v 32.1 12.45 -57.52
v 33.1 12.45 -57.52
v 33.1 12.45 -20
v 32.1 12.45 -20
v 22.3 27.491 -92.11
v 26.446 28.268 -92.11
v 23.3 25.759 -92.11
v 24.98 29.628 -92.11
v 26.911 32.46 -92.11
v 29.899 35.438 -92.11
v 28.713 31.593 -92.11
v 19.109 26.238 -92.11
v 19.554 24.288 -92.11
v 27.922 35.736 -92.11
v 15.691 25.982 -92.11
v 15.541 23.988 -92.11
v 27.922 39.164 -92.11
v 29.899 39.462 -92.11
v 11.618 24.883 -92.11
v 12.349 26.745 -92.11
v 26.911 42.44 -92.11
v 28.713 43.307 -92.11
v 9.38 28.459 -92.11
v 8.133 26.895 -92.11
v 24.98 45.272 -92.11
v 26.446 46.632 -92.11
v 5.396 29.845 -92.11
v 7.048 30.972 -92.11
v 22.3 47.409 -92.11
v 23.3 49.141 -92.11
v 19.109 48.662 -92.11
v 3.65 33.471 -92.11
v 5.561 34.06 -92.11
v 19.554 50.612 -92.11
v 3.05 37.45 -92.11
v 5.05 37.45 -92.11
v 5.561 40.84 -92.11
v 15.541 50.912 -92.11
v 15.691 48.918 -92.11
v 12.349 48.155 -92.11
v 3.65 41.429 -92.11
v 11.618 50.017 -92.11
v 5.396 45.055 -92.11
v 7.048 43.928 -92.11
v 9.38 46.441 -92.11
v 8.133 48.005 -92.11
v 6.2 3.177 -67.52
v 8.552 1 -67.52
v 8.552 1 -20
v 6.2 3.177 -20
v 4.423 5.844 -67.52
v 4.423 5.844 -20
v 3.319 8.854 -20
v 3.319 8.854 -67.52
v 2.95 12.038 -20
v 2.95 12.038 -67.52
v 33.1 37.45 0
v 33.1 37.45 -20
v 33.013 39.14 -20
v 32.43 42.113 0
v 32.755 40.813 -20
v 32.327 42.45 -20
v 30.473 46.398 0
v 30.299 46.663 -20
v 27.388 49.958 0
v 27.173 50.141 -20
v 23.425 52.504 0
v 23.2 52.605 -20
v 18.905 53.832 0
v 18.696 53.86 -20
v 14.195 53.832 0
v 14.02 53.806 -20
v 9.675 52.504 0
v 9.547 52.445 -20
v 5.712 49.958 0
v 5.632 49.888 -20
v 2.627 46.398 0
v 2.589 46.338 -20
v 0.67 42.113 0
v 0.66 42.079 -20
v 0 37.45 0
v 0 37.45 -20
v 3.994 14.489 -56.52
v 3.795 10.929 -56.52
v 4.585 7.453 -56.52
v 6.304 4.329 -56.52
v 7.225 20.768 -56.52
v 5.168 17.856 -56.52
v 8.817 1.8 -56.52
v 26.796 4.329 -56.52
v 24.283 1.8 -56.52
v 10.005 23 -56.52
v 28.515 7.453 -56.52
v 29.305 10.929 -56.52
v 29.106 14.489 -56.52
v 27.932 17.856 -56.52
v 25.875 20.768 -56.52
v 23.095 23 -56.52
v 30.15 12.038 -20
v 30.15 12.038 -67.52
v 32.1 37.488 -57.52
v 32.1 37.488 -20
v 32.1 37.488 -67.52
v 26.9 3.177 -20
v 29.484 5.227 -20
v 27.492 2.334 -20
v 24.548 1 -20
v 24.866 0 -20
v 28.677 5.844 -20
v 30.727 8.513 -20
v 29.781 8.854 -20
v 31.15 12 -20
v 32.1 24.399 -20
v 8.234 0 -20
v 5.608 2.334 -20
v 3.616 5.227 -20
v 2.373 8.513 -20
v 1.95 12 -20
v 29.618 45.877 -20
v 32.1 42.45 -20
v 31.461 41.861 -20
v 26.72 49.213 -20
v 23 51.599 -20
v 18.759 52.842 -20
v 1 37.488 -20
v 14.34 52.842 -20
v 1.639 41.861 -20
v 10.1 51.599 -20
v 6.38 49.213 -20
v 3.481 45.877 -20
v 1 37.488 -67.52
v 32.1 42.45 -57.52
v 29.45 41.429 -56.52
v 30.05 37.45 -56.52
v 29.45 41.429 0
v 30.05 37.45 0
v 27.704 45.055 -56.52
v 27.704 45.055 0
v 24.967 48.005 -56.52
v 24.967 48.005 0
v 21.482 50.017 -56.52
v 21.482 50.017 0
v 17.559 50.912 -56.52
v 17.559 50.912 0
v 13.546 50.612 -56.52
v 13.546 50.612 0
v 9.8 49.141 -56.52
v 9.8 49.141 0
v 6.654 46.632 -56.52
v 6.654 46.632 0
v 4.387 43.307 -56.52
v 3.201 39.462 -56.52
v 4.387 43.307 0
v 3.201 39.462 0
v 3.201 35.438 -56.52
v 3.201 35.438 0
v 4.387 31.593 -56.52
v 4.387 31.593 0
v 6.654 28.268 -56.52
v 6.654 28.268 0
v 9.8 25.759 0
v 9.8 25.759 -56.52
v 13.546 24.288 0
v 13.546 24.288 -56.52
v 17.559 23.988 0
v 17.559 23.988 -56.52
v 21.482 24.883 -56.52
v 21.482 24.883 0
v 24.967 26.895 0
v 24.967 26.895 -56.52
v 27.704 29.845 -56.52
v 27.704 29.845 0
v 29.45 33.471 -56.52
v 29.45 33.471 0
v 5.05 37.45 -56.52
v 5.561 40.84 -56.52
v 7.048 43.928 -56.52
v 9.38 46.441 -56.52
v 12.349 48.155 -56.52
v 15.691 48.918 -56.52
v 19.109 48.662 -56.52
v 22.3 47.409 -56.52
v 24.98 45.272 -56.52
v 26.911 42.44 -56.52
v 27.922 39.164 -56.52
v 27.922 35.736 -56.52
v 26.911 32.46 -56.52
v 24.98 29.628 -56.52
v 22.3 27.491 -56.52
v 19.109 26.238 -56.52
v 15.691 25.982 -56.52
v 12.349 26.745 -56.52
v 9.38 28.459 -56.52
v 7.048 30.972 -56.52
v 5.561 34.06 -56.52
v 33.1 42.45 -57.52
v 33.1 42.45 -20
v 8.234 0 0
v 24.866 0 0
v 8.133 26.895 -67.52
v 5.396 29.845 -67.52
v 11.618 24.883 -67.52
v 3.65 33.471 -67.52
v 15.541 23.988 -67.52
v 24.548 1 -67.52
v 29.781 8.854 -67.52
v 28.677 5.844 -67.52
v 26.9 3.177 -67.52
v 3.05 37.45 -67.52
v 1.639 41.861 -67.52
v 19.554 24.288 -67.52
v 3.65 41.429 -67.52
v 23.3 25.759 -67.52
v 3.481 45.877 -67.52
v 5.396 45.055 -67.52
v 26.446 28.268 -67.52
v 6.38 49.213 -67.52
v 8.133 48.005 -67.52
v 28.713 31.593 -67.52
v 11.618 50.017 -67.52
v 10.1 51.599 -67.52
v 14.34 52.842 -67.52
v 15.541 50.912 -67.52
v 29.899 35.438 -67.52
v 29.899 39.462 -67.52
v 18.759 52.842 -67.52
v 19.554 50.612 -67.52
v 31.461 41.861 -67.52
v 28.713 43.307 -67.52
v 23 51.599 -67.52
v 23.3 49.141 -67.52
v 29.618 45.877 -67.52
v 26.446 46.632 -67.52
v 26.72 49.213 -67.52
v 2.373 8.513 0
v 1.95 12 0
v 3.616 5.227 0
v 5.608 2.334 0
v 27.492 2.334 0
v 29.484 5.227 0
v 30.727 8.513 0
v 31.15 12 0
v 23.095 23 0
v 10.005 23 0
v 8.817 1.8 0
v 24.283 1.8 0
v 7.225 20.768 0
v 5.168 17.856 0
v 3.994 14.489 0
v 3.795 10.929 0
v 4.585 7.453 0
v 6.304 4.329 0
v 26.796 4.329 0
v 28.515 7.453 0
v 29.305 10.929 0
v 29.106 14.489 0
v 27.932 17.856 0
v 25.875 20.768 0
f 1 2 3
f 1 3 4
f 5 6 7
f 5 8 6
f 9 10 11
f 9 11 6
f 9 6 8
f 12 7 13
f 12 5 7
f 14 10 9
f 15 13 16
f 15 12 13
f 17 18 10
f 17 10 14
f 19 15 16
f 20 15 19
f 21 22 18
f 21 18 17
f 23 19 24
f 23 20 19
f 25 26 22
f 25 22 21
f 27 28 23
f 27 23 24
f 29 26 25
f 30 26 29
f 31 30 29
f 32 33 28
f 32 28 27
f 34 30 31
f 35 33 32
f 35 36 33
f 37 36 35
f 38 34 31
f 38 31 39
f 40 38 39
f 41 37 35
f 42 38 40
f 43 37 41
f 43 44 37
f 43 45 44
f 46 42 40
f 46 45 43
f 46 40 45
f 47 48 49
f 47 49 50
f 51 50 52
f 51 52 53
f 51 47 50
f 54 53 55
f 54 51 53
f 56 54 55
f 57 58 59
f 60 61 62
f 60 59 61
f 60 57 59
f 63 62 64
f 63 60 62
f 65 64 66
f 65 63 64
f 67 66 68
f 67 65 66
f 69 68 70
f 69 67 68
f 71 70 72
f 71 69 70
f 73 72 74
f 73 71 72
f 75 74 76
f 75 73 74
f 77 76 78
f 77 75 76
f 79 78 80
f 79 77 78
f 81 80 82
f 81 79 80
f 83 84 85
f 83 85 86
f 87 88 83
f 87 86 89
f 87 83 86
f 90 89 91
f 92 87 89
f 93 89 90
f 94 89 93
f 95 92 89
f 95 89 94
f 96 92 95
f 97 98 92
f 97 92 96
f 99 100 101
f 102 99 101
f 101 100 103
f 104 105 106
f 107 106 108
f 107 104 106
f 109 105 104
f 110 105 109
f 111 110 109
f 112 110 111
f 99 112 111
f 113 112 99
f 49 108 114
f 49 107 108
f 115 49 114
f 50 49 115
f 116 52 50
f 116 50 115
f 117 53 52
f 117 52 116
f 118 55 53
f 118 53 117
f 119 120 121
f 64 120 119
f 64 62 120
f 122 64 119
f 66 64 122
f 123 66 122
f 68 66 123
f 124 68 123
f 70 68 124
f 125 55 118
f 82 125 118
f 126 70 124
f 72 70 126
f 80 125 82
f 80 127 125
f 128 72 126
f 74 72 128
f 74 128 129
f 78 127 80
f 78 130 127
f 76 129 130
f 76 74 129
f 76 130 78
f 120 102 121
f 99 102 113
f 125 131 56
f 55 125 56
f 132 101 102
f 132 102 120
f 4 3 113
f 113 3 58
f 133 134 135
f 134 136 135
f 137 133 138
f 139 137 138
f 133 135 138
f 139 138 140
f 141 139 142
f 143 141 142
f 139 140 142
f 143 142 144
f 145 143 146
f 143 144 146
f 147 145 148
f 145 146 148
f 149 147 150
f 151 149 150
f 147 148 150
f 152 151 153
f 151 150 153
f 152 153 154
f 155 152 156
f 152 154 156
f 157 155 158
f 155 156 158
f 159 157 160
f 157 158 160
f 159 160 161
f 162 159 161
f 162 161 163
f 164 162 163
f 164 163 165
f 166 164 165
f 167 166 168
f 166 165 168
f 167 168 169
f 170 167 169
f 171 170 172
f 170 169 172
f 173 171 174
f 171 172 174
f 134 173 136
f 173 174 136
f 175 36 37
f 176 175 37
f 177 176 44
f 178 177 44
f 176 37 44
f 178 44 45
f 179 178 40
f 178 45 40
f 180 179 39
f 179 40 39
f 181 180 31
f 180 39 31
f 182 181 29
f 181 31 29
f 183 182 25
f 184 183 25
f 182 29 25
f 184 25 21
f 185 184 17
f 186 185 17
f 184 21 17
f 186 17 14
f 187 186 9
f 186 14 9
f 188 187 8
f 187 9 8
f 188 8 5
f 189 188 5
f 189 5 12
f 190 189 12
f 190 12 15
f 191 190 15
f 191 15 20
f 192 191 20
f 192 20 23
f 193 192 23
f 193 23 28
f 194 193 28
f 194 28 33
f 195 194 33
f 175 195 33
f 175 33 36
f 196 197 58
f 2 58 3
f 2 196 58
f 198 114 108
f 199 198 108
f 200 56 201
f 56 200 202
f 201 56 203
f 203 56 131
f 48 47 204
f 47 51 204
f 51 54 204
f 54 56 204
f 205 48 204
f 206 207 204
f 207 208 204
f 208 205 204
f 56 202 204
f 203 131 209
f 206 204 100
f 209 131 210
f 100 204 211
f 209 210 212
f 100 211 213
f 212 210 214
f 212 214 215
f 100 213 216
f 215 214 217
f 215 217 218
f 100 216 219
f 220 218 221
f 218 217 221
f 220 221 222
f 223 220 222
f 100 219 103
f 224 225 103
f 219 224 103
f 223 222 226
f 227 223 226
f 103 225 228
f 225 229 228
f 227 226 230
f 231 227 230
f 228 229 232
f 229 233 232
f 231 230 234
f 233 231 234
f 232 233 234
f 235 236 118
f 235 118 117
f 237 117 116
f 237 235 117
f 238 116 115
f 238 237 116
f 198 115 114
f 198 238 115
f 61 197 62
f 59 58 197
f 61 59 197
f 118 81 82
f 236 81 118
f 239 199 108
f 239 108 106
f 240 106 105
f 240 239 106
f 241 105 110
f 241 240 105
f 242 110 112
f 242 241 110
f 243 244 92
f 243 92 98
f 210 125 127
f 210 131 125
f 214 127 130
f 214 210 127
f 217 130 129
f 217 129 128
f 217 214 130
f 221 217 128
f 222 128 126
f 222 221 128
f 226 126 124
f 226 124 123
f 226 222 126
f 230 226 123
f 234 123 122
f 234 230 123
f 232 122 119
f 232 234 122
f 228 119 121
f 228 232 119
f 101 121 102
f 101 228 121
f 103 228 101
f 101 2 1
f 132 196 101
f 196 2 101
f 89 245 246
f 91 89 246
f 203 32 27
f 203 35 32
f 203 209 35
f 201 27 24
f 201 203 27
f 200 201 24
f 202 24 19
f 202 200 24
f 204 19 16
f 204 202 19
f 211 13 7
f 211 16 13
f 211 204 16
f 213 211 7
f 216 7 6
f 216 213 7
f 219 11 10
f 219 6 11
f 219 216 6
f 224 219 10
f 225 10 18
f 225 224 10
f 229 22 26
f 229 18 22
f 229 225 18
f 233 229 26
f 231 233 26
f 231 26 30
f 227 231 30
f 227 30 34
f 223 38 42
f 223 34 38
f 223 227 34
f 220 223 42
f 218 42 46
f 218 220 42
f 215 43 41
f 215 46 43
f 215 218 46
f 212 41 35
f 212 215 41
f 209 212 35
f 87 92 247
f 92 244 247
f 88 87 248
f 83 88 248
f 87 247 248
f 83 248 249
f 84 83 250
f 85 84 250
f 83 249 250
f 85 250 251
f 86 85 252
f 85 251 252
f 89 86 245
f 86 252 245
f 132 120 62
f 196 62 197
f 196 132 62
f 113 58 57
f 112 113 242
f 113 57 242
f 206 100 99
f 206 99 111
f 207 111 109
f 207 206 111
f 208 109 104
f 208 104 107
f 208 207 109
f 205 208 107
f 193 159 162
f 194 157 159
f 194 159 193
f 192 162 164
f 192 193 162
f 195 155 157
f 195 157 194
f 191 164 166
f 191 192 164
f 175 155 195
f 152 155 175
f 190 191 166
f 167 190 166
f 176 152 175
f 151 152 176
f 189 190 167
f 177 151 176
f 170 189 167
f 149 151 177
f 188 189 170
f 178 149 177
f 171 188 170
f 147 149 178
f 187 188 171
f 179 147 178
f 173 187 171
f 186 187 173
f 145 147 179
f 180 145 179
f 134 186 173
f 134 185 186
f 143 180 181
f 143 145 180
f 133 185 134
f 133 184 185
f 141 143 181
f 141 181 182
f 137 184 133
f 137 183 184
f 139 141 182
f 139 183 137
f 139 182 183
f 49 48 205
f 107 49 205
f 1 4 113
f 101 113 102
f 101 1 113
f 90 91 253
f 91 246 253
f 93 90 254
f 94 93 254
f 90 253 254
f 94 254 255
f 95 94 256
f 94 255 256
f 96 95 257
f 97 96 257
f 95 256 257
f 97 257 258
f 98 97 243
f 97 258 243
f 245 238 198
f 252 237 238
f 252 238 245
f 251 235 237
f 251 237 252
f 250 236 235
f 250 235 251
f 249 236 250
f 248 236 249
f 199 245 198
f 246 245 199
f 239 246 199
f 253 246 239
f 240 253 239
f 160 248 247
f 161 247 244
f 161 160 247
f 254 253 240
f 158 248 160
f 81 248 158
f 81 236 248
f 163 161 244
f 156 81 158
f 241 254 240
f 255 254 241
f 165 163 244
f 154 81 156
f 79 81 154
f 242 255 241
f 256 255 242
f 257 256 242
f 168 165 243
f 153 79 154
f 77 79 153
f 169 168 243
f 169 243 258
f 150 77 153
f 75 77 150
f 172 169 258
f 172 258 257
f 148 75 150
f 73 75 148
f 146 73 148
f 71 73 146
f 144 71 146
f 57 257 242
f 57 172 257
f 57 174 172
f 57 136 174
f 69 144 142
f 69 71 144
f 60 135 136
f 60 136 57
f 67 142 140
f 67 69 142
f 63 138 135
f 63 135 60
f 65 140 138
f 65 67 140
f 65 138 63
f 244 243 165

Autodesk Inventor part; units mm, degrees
ref_plane "YZ Plane" through (0, 0, 0) normal (1, 0, 0) x (0, 1, 0)
ref_plane "XZ Plane" through (0, 0, 0) normal (0, 1, 0) x (-1, 0, 0)
ref_plane "XY Plane" through (0, 0, 0) normal (0, 0, 1) x (1, 0, 0)
sketch "Sketch1" plane through (0, 0, 0) normal (0, 0, 1) x (1, 0, 0)
  line L0 (0, 0) -> (33.1, 0)
  line L1 (33.1, 0) -> (33.1, 54)
  line L2 (33.1, 54) -> (0, 54)
  line L3 (0, 54) -> (0, 0)
  arc A0 (32.9068, 34.9287) -> (0.1932, 34.9287) centre (16.55, 37.45) ccw
  line L4 (0, 37.45) -> (1.95, 12)
  line L5 (1.95, 12) -> (13.9851, 12) construction
  line L6 (8.2338, 0) -> (24.8662, 0)
  line L7 (33.1, 37.45) -> (31.15, 12)
  arc A1 (1.95, 12) -> (8.2338, 0) centre (16.55, 12) ccw
  arc A2 (24.8662, 0) -> (31.15, 12) centre (16.55, 12) ccw
  dimension "d0" = 33.1
  dimension "d1" = 54
  dimension "d2" = 33.1
extrude "Extrusion1" add sketch "Sketch1" against normal blind 67.52 contours A1 L4 A0 L7 A2 L0
sketch "Sketch3" plane through (0, 0, 0) normal (0, 0, 1) x (1, 0, 0)
  arc A0 (33.1, 37.45) -> (0, 37.45) centre (16.55, 37.45) ccw projected
  circle A1 centre (16.55, 37.45) radius 13.5
  arc A2 (24.8662, 0) -> (31.15, 12) centre (16.55, 12) ccw projected
  line L0 (8.817, 1.8) -> (24.283, 1.8)
  line L1 (8.817, 1.8) -> (24.283, 1.8) construction
  line L2 (10.0048, 23) -> (23.0952, 23)
  arc A3 (10.0048, 23) -> (8.817, 1.8) centre (16.55, 12) ccw
  arc A4 (24.283, 1.8) -> (23.0952, 23) centre (16.55, 12) ccw
  point P0 (0, 0)
  dimension "d7" = 27
extrude "Extrusion2" cut sketch "Sketch3" against normal blind 56.52
sketch "Sketch4" plane through (0, 0, -67.52) normal (0, 0, -1) x (-1, 0, 0)
  arc A0 (0, 37.45) -> (-33.1, 37.45) centre (-16.55, 37.45) ccw projected
  circle A1 centre (-16.55, 37.45) radius 13.5
  point P0 (0, 0)
extrude "Extrusion3" add sketch "Sketch4" along normal blind 24.59
sketch "Sketch7" plane through (0, 0, -67.52) normal (0, 0, -1) x (-1, 0, 0)
  circle A0 centre (-16.55, 37.45) radius 13.5 projected
  arc A1 (0, 37.45) -> (-33.1, 37.45) centre (-16.55, 37.45) ccw
  arc A2 (-23.0952, 23) -> (-24.283, 1.8) centre (-16.55, 12) ccw projected
  line L0 (-1.95, 12) -> (0, 37.45)
  line L1 (-24.8662, 0) -> (-8.2338, 0) projected
  line L2 (-24.8662, 0) -> (-8.2338, 0)
  arc A3 (-8.2338, 0) -> (-1.95, 12) centre (-16.55, 12) ccw
  arc A4 (-31.15, 12) -> (-24.8662, 0) centre (-16.55, 12) ccw
  arc A5 (-31.15, 12) -> (-24.8662, 0) centre (-16.55, 12) ccw projected
  line L3 (-31.15, 12) -> (-33.1, 37.45)
  arc A6 (-1, 37.4877) -> (-32.1, 37.45) centre (-16.55, 37.45) ccw
  line L4 (-1, 37.4877) -> (-2.9501, 12.0376)
  arc A7 (-8.5525, 1) -> (-2.9501, 12.0376) centre (-16.55, 12) ccw
  line L5 (-8.5525, 1) -> (-24.5475, 1)
  arc A8 (-30.1499, 12.0376) -> (-24.5475, 1) centre (-16.55, 12) ccw
  line L6 (-30.1499, 12.0376) -> (-32.1029, 37.5264)
  point P0 (0, 0)
  point P1 (-32.1, 37.4877)
  dimension "d21" = 1
extrude "Extrusion6" cut sketch "Sketch7" against normal blind 47.52 contours L0 A3 L1 A4 L3 A1
sketch "Sketch8" plane through (16.55, 37.45, -92.11) normal (0, 0, -1) x (-1, 0, 0)
  circle A0 centre (0, 0) radius 11.5
  point P0 (16.55, -37.45)
  dimension "d24" = 23
extrude "Extrusion7" cut sketch "Sketch8" against normal blind 44.77
sketch "Sketch11" plane through (0, 0, -67.52) normal (0, 0, -1) x (-1, 0, 0)
  arc A0 (0, 37.45) -> (-33.1, 37.45) centre (-16.55, 37.45) ccw projected
  line L0 (-33.1, 37.45) -> (-28.1, 37.45) construction
  line L1 (-33.1, 12.45) -> (-32.1, 12.45)
  line L2 (-32.1, 12.45) -> (-32.1, 42.45)
  line L3 (-32.1, 42.45) -> (-33.1, 42.45)
  line L4 (-33.1, 42.45) -> (-33.1, 12.45)
  point P0 (0, 0)
  dimension "d39" = 1
extrude "Extrusion9" add sketch "Sketch11" against normal blind 47.52
sketch "Sketch12" plane through (0, 0, -67.52) normal (0, 0, -1) x (-1, 0, 0)
  line L0 (-32.1, 12.45) -> (-33.1, 12.45) projected
  line L1 (-32.1, 42.45) -> (-32.1, 24.3987) projected
  line L2 (-33.1, 12.45) -> (-32.1, 12.45)
  line L3 (-32.1, 12.45) -> (-32.1, 42.45)
  line L4 (-32.1, 42.45) -> (-33.1, 42.45)
  line L5 (-33.1, 42.45) -> (-33.1, 12.45)
  point P0 (0, 0)
extrude "Extrusion10" cut sketch "Sketch12" against normal blind 10
properties part number "Big LRF Real"
